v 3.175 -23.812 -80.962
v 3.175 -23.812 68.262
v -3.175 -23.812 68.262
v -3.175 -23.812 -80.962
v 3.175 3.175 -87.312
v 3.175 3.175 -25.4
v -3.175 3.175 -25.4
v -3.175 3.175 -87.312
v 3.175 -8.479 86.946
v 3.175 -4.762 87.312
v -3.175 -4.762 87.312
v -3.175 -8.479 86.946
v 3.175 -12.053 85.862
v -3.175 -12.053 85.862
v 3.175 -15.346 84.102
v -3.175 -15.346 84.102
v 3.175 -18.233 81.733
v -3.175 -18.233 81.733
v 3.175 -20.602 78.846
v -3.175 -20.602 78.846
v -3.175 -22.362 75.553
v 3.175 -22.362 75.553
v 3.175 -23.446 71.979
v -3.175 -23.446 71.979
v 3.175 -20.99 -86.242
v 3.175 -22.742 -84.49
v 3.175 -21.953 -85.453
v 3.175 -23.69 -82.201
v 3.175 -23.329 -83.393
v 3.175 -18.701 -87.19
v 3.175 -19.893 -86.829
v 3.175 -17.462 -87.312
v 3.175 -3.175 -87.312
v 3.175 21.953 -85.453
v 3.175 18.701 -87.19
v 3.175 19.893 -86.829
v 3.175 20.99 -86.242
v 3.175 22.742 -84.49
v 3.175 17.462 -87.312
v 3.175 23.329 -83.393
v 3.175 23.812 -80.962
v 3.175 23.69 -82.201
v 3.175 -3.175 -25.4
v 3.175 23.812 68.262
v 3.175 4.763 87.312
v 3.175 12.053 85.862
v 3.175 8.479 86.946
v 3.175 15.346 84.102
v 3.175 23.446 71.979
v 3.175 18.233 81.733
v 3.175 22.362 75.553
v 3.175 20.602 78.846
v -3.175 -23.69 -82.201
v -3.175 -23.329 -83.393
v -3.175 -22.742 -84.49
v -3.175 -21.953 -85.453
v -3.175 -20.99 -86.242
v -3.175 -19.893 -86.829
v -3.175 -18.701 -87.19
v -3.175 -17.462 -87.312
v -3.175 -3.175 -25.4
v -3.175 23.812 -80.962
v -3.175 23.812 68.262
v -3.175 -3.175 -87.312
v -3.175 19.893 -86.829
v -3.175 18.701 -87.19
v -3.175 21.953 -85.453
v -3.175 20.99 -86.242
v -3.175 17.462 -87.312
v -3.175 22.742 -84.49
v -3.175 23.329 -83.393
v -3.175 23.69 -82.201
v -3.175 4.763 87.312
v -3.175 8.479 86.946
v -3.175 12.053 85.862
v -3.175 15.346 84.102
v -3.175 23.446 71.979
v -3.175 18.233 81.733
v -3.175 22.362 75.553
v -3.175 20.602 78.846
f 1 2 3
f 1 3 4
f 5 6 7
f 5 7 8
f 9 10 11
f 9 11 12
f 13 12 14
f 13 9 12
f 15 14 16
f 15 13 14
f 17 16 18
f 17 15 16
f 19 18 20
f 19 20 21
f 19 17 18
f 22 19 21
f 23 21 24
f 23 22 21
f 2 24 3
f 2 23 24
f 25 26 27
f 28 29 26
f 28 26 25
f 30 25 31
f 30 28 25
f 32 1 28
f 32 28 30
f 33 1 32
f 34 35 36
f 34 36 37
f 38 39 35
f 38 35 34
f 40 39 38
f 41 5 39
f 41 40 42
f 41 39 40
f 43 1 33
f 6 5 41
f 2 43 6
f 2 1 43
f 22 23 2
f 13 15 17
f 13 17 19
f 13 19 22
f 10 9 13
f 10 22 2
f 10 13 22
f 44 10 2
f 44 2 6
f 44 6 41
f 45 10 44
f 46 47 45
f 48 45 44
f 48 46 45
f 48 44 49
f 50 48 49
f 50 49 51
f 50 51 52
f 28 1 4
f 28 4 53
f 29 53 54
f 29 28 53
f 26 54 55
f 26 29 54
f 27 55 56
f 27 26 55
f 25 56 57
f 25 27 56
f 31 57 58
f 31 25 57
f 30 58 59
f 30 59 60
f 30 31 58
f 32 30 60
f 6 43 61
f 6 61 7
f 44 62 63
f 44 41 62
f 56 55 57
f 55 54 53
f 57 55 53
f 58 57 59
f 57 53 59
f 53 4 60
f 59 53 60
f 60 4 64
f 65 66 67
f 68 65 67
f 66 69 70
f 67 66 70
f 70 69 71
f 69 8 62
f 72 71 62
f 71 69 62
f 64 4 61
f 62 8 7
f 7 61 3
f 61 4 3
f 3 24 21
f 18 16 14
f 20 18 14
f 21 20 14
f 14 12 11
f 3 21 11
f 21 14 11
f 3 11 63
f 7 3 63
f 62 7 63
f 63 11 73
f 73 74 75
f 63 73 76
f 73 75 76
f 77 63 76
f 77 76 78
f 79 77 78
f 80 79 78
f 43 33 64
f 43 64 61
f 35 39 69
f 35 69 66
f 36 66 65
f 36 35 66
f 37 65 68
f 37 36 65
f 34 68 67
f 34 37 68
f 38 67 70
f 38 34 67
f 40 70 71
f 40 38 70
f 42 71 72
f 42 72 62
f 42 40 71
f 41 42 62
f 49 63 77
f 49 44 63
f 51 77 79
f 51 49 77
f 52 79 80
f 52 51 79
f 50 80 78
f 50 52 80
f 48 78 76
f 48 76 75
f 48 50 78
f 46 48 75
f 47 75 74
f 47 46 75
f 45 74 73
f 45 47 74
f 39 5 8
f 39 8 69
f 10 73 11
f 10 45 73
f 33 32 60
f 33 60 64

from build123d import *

# Parameters (mm, degrees)
F1_DEPTH = 3.175


with BuildPart() as f1:
    # F0 (on Right) → F1 (new body, symmetric)
    with BuildSketch(Plane.YZ):
        with BuildLine():
            Line((4.7625, 87.3125), (-4.7625, 87.3125))
            ThreePointArc((-4.7625, 87.3125), (-18.232884, 81.732884), (-23.8125, 68.2625))
            Line((-23.8125, 68.2625), (-23.8125, -80.9625))
            ThreePointArc((-23.8125, -80.9625), (-21.952628, -85.452628), (-17.4625, -87.3125))
            Line((-17.4625, -87.3125), (-3.175, -87.3125))
            Line((-3.175, -87.3125), (-3.175, -25.4))
            Line((-3.175, -25.4), (3.175, -25.4))
            Line((3.175, -25.4), (3.175, -87.3125))
            Line((3.175, -87.3125), (17.4625, -87.3125))
            ThreePointArc((17.4625, -87.3125), (21.952628, -85.452628), (23.8125, -80.9625))
            Line((23.8125, -80.9625), (23.8125, 68.2625))
            ThreePointArc((23.8125, 68.2625), (18.232884, 81.732884), (4.7625, 87.3125))
        make_face()
    extrude(amount=F1_DEPTH, both=True)


solid = f1.part
